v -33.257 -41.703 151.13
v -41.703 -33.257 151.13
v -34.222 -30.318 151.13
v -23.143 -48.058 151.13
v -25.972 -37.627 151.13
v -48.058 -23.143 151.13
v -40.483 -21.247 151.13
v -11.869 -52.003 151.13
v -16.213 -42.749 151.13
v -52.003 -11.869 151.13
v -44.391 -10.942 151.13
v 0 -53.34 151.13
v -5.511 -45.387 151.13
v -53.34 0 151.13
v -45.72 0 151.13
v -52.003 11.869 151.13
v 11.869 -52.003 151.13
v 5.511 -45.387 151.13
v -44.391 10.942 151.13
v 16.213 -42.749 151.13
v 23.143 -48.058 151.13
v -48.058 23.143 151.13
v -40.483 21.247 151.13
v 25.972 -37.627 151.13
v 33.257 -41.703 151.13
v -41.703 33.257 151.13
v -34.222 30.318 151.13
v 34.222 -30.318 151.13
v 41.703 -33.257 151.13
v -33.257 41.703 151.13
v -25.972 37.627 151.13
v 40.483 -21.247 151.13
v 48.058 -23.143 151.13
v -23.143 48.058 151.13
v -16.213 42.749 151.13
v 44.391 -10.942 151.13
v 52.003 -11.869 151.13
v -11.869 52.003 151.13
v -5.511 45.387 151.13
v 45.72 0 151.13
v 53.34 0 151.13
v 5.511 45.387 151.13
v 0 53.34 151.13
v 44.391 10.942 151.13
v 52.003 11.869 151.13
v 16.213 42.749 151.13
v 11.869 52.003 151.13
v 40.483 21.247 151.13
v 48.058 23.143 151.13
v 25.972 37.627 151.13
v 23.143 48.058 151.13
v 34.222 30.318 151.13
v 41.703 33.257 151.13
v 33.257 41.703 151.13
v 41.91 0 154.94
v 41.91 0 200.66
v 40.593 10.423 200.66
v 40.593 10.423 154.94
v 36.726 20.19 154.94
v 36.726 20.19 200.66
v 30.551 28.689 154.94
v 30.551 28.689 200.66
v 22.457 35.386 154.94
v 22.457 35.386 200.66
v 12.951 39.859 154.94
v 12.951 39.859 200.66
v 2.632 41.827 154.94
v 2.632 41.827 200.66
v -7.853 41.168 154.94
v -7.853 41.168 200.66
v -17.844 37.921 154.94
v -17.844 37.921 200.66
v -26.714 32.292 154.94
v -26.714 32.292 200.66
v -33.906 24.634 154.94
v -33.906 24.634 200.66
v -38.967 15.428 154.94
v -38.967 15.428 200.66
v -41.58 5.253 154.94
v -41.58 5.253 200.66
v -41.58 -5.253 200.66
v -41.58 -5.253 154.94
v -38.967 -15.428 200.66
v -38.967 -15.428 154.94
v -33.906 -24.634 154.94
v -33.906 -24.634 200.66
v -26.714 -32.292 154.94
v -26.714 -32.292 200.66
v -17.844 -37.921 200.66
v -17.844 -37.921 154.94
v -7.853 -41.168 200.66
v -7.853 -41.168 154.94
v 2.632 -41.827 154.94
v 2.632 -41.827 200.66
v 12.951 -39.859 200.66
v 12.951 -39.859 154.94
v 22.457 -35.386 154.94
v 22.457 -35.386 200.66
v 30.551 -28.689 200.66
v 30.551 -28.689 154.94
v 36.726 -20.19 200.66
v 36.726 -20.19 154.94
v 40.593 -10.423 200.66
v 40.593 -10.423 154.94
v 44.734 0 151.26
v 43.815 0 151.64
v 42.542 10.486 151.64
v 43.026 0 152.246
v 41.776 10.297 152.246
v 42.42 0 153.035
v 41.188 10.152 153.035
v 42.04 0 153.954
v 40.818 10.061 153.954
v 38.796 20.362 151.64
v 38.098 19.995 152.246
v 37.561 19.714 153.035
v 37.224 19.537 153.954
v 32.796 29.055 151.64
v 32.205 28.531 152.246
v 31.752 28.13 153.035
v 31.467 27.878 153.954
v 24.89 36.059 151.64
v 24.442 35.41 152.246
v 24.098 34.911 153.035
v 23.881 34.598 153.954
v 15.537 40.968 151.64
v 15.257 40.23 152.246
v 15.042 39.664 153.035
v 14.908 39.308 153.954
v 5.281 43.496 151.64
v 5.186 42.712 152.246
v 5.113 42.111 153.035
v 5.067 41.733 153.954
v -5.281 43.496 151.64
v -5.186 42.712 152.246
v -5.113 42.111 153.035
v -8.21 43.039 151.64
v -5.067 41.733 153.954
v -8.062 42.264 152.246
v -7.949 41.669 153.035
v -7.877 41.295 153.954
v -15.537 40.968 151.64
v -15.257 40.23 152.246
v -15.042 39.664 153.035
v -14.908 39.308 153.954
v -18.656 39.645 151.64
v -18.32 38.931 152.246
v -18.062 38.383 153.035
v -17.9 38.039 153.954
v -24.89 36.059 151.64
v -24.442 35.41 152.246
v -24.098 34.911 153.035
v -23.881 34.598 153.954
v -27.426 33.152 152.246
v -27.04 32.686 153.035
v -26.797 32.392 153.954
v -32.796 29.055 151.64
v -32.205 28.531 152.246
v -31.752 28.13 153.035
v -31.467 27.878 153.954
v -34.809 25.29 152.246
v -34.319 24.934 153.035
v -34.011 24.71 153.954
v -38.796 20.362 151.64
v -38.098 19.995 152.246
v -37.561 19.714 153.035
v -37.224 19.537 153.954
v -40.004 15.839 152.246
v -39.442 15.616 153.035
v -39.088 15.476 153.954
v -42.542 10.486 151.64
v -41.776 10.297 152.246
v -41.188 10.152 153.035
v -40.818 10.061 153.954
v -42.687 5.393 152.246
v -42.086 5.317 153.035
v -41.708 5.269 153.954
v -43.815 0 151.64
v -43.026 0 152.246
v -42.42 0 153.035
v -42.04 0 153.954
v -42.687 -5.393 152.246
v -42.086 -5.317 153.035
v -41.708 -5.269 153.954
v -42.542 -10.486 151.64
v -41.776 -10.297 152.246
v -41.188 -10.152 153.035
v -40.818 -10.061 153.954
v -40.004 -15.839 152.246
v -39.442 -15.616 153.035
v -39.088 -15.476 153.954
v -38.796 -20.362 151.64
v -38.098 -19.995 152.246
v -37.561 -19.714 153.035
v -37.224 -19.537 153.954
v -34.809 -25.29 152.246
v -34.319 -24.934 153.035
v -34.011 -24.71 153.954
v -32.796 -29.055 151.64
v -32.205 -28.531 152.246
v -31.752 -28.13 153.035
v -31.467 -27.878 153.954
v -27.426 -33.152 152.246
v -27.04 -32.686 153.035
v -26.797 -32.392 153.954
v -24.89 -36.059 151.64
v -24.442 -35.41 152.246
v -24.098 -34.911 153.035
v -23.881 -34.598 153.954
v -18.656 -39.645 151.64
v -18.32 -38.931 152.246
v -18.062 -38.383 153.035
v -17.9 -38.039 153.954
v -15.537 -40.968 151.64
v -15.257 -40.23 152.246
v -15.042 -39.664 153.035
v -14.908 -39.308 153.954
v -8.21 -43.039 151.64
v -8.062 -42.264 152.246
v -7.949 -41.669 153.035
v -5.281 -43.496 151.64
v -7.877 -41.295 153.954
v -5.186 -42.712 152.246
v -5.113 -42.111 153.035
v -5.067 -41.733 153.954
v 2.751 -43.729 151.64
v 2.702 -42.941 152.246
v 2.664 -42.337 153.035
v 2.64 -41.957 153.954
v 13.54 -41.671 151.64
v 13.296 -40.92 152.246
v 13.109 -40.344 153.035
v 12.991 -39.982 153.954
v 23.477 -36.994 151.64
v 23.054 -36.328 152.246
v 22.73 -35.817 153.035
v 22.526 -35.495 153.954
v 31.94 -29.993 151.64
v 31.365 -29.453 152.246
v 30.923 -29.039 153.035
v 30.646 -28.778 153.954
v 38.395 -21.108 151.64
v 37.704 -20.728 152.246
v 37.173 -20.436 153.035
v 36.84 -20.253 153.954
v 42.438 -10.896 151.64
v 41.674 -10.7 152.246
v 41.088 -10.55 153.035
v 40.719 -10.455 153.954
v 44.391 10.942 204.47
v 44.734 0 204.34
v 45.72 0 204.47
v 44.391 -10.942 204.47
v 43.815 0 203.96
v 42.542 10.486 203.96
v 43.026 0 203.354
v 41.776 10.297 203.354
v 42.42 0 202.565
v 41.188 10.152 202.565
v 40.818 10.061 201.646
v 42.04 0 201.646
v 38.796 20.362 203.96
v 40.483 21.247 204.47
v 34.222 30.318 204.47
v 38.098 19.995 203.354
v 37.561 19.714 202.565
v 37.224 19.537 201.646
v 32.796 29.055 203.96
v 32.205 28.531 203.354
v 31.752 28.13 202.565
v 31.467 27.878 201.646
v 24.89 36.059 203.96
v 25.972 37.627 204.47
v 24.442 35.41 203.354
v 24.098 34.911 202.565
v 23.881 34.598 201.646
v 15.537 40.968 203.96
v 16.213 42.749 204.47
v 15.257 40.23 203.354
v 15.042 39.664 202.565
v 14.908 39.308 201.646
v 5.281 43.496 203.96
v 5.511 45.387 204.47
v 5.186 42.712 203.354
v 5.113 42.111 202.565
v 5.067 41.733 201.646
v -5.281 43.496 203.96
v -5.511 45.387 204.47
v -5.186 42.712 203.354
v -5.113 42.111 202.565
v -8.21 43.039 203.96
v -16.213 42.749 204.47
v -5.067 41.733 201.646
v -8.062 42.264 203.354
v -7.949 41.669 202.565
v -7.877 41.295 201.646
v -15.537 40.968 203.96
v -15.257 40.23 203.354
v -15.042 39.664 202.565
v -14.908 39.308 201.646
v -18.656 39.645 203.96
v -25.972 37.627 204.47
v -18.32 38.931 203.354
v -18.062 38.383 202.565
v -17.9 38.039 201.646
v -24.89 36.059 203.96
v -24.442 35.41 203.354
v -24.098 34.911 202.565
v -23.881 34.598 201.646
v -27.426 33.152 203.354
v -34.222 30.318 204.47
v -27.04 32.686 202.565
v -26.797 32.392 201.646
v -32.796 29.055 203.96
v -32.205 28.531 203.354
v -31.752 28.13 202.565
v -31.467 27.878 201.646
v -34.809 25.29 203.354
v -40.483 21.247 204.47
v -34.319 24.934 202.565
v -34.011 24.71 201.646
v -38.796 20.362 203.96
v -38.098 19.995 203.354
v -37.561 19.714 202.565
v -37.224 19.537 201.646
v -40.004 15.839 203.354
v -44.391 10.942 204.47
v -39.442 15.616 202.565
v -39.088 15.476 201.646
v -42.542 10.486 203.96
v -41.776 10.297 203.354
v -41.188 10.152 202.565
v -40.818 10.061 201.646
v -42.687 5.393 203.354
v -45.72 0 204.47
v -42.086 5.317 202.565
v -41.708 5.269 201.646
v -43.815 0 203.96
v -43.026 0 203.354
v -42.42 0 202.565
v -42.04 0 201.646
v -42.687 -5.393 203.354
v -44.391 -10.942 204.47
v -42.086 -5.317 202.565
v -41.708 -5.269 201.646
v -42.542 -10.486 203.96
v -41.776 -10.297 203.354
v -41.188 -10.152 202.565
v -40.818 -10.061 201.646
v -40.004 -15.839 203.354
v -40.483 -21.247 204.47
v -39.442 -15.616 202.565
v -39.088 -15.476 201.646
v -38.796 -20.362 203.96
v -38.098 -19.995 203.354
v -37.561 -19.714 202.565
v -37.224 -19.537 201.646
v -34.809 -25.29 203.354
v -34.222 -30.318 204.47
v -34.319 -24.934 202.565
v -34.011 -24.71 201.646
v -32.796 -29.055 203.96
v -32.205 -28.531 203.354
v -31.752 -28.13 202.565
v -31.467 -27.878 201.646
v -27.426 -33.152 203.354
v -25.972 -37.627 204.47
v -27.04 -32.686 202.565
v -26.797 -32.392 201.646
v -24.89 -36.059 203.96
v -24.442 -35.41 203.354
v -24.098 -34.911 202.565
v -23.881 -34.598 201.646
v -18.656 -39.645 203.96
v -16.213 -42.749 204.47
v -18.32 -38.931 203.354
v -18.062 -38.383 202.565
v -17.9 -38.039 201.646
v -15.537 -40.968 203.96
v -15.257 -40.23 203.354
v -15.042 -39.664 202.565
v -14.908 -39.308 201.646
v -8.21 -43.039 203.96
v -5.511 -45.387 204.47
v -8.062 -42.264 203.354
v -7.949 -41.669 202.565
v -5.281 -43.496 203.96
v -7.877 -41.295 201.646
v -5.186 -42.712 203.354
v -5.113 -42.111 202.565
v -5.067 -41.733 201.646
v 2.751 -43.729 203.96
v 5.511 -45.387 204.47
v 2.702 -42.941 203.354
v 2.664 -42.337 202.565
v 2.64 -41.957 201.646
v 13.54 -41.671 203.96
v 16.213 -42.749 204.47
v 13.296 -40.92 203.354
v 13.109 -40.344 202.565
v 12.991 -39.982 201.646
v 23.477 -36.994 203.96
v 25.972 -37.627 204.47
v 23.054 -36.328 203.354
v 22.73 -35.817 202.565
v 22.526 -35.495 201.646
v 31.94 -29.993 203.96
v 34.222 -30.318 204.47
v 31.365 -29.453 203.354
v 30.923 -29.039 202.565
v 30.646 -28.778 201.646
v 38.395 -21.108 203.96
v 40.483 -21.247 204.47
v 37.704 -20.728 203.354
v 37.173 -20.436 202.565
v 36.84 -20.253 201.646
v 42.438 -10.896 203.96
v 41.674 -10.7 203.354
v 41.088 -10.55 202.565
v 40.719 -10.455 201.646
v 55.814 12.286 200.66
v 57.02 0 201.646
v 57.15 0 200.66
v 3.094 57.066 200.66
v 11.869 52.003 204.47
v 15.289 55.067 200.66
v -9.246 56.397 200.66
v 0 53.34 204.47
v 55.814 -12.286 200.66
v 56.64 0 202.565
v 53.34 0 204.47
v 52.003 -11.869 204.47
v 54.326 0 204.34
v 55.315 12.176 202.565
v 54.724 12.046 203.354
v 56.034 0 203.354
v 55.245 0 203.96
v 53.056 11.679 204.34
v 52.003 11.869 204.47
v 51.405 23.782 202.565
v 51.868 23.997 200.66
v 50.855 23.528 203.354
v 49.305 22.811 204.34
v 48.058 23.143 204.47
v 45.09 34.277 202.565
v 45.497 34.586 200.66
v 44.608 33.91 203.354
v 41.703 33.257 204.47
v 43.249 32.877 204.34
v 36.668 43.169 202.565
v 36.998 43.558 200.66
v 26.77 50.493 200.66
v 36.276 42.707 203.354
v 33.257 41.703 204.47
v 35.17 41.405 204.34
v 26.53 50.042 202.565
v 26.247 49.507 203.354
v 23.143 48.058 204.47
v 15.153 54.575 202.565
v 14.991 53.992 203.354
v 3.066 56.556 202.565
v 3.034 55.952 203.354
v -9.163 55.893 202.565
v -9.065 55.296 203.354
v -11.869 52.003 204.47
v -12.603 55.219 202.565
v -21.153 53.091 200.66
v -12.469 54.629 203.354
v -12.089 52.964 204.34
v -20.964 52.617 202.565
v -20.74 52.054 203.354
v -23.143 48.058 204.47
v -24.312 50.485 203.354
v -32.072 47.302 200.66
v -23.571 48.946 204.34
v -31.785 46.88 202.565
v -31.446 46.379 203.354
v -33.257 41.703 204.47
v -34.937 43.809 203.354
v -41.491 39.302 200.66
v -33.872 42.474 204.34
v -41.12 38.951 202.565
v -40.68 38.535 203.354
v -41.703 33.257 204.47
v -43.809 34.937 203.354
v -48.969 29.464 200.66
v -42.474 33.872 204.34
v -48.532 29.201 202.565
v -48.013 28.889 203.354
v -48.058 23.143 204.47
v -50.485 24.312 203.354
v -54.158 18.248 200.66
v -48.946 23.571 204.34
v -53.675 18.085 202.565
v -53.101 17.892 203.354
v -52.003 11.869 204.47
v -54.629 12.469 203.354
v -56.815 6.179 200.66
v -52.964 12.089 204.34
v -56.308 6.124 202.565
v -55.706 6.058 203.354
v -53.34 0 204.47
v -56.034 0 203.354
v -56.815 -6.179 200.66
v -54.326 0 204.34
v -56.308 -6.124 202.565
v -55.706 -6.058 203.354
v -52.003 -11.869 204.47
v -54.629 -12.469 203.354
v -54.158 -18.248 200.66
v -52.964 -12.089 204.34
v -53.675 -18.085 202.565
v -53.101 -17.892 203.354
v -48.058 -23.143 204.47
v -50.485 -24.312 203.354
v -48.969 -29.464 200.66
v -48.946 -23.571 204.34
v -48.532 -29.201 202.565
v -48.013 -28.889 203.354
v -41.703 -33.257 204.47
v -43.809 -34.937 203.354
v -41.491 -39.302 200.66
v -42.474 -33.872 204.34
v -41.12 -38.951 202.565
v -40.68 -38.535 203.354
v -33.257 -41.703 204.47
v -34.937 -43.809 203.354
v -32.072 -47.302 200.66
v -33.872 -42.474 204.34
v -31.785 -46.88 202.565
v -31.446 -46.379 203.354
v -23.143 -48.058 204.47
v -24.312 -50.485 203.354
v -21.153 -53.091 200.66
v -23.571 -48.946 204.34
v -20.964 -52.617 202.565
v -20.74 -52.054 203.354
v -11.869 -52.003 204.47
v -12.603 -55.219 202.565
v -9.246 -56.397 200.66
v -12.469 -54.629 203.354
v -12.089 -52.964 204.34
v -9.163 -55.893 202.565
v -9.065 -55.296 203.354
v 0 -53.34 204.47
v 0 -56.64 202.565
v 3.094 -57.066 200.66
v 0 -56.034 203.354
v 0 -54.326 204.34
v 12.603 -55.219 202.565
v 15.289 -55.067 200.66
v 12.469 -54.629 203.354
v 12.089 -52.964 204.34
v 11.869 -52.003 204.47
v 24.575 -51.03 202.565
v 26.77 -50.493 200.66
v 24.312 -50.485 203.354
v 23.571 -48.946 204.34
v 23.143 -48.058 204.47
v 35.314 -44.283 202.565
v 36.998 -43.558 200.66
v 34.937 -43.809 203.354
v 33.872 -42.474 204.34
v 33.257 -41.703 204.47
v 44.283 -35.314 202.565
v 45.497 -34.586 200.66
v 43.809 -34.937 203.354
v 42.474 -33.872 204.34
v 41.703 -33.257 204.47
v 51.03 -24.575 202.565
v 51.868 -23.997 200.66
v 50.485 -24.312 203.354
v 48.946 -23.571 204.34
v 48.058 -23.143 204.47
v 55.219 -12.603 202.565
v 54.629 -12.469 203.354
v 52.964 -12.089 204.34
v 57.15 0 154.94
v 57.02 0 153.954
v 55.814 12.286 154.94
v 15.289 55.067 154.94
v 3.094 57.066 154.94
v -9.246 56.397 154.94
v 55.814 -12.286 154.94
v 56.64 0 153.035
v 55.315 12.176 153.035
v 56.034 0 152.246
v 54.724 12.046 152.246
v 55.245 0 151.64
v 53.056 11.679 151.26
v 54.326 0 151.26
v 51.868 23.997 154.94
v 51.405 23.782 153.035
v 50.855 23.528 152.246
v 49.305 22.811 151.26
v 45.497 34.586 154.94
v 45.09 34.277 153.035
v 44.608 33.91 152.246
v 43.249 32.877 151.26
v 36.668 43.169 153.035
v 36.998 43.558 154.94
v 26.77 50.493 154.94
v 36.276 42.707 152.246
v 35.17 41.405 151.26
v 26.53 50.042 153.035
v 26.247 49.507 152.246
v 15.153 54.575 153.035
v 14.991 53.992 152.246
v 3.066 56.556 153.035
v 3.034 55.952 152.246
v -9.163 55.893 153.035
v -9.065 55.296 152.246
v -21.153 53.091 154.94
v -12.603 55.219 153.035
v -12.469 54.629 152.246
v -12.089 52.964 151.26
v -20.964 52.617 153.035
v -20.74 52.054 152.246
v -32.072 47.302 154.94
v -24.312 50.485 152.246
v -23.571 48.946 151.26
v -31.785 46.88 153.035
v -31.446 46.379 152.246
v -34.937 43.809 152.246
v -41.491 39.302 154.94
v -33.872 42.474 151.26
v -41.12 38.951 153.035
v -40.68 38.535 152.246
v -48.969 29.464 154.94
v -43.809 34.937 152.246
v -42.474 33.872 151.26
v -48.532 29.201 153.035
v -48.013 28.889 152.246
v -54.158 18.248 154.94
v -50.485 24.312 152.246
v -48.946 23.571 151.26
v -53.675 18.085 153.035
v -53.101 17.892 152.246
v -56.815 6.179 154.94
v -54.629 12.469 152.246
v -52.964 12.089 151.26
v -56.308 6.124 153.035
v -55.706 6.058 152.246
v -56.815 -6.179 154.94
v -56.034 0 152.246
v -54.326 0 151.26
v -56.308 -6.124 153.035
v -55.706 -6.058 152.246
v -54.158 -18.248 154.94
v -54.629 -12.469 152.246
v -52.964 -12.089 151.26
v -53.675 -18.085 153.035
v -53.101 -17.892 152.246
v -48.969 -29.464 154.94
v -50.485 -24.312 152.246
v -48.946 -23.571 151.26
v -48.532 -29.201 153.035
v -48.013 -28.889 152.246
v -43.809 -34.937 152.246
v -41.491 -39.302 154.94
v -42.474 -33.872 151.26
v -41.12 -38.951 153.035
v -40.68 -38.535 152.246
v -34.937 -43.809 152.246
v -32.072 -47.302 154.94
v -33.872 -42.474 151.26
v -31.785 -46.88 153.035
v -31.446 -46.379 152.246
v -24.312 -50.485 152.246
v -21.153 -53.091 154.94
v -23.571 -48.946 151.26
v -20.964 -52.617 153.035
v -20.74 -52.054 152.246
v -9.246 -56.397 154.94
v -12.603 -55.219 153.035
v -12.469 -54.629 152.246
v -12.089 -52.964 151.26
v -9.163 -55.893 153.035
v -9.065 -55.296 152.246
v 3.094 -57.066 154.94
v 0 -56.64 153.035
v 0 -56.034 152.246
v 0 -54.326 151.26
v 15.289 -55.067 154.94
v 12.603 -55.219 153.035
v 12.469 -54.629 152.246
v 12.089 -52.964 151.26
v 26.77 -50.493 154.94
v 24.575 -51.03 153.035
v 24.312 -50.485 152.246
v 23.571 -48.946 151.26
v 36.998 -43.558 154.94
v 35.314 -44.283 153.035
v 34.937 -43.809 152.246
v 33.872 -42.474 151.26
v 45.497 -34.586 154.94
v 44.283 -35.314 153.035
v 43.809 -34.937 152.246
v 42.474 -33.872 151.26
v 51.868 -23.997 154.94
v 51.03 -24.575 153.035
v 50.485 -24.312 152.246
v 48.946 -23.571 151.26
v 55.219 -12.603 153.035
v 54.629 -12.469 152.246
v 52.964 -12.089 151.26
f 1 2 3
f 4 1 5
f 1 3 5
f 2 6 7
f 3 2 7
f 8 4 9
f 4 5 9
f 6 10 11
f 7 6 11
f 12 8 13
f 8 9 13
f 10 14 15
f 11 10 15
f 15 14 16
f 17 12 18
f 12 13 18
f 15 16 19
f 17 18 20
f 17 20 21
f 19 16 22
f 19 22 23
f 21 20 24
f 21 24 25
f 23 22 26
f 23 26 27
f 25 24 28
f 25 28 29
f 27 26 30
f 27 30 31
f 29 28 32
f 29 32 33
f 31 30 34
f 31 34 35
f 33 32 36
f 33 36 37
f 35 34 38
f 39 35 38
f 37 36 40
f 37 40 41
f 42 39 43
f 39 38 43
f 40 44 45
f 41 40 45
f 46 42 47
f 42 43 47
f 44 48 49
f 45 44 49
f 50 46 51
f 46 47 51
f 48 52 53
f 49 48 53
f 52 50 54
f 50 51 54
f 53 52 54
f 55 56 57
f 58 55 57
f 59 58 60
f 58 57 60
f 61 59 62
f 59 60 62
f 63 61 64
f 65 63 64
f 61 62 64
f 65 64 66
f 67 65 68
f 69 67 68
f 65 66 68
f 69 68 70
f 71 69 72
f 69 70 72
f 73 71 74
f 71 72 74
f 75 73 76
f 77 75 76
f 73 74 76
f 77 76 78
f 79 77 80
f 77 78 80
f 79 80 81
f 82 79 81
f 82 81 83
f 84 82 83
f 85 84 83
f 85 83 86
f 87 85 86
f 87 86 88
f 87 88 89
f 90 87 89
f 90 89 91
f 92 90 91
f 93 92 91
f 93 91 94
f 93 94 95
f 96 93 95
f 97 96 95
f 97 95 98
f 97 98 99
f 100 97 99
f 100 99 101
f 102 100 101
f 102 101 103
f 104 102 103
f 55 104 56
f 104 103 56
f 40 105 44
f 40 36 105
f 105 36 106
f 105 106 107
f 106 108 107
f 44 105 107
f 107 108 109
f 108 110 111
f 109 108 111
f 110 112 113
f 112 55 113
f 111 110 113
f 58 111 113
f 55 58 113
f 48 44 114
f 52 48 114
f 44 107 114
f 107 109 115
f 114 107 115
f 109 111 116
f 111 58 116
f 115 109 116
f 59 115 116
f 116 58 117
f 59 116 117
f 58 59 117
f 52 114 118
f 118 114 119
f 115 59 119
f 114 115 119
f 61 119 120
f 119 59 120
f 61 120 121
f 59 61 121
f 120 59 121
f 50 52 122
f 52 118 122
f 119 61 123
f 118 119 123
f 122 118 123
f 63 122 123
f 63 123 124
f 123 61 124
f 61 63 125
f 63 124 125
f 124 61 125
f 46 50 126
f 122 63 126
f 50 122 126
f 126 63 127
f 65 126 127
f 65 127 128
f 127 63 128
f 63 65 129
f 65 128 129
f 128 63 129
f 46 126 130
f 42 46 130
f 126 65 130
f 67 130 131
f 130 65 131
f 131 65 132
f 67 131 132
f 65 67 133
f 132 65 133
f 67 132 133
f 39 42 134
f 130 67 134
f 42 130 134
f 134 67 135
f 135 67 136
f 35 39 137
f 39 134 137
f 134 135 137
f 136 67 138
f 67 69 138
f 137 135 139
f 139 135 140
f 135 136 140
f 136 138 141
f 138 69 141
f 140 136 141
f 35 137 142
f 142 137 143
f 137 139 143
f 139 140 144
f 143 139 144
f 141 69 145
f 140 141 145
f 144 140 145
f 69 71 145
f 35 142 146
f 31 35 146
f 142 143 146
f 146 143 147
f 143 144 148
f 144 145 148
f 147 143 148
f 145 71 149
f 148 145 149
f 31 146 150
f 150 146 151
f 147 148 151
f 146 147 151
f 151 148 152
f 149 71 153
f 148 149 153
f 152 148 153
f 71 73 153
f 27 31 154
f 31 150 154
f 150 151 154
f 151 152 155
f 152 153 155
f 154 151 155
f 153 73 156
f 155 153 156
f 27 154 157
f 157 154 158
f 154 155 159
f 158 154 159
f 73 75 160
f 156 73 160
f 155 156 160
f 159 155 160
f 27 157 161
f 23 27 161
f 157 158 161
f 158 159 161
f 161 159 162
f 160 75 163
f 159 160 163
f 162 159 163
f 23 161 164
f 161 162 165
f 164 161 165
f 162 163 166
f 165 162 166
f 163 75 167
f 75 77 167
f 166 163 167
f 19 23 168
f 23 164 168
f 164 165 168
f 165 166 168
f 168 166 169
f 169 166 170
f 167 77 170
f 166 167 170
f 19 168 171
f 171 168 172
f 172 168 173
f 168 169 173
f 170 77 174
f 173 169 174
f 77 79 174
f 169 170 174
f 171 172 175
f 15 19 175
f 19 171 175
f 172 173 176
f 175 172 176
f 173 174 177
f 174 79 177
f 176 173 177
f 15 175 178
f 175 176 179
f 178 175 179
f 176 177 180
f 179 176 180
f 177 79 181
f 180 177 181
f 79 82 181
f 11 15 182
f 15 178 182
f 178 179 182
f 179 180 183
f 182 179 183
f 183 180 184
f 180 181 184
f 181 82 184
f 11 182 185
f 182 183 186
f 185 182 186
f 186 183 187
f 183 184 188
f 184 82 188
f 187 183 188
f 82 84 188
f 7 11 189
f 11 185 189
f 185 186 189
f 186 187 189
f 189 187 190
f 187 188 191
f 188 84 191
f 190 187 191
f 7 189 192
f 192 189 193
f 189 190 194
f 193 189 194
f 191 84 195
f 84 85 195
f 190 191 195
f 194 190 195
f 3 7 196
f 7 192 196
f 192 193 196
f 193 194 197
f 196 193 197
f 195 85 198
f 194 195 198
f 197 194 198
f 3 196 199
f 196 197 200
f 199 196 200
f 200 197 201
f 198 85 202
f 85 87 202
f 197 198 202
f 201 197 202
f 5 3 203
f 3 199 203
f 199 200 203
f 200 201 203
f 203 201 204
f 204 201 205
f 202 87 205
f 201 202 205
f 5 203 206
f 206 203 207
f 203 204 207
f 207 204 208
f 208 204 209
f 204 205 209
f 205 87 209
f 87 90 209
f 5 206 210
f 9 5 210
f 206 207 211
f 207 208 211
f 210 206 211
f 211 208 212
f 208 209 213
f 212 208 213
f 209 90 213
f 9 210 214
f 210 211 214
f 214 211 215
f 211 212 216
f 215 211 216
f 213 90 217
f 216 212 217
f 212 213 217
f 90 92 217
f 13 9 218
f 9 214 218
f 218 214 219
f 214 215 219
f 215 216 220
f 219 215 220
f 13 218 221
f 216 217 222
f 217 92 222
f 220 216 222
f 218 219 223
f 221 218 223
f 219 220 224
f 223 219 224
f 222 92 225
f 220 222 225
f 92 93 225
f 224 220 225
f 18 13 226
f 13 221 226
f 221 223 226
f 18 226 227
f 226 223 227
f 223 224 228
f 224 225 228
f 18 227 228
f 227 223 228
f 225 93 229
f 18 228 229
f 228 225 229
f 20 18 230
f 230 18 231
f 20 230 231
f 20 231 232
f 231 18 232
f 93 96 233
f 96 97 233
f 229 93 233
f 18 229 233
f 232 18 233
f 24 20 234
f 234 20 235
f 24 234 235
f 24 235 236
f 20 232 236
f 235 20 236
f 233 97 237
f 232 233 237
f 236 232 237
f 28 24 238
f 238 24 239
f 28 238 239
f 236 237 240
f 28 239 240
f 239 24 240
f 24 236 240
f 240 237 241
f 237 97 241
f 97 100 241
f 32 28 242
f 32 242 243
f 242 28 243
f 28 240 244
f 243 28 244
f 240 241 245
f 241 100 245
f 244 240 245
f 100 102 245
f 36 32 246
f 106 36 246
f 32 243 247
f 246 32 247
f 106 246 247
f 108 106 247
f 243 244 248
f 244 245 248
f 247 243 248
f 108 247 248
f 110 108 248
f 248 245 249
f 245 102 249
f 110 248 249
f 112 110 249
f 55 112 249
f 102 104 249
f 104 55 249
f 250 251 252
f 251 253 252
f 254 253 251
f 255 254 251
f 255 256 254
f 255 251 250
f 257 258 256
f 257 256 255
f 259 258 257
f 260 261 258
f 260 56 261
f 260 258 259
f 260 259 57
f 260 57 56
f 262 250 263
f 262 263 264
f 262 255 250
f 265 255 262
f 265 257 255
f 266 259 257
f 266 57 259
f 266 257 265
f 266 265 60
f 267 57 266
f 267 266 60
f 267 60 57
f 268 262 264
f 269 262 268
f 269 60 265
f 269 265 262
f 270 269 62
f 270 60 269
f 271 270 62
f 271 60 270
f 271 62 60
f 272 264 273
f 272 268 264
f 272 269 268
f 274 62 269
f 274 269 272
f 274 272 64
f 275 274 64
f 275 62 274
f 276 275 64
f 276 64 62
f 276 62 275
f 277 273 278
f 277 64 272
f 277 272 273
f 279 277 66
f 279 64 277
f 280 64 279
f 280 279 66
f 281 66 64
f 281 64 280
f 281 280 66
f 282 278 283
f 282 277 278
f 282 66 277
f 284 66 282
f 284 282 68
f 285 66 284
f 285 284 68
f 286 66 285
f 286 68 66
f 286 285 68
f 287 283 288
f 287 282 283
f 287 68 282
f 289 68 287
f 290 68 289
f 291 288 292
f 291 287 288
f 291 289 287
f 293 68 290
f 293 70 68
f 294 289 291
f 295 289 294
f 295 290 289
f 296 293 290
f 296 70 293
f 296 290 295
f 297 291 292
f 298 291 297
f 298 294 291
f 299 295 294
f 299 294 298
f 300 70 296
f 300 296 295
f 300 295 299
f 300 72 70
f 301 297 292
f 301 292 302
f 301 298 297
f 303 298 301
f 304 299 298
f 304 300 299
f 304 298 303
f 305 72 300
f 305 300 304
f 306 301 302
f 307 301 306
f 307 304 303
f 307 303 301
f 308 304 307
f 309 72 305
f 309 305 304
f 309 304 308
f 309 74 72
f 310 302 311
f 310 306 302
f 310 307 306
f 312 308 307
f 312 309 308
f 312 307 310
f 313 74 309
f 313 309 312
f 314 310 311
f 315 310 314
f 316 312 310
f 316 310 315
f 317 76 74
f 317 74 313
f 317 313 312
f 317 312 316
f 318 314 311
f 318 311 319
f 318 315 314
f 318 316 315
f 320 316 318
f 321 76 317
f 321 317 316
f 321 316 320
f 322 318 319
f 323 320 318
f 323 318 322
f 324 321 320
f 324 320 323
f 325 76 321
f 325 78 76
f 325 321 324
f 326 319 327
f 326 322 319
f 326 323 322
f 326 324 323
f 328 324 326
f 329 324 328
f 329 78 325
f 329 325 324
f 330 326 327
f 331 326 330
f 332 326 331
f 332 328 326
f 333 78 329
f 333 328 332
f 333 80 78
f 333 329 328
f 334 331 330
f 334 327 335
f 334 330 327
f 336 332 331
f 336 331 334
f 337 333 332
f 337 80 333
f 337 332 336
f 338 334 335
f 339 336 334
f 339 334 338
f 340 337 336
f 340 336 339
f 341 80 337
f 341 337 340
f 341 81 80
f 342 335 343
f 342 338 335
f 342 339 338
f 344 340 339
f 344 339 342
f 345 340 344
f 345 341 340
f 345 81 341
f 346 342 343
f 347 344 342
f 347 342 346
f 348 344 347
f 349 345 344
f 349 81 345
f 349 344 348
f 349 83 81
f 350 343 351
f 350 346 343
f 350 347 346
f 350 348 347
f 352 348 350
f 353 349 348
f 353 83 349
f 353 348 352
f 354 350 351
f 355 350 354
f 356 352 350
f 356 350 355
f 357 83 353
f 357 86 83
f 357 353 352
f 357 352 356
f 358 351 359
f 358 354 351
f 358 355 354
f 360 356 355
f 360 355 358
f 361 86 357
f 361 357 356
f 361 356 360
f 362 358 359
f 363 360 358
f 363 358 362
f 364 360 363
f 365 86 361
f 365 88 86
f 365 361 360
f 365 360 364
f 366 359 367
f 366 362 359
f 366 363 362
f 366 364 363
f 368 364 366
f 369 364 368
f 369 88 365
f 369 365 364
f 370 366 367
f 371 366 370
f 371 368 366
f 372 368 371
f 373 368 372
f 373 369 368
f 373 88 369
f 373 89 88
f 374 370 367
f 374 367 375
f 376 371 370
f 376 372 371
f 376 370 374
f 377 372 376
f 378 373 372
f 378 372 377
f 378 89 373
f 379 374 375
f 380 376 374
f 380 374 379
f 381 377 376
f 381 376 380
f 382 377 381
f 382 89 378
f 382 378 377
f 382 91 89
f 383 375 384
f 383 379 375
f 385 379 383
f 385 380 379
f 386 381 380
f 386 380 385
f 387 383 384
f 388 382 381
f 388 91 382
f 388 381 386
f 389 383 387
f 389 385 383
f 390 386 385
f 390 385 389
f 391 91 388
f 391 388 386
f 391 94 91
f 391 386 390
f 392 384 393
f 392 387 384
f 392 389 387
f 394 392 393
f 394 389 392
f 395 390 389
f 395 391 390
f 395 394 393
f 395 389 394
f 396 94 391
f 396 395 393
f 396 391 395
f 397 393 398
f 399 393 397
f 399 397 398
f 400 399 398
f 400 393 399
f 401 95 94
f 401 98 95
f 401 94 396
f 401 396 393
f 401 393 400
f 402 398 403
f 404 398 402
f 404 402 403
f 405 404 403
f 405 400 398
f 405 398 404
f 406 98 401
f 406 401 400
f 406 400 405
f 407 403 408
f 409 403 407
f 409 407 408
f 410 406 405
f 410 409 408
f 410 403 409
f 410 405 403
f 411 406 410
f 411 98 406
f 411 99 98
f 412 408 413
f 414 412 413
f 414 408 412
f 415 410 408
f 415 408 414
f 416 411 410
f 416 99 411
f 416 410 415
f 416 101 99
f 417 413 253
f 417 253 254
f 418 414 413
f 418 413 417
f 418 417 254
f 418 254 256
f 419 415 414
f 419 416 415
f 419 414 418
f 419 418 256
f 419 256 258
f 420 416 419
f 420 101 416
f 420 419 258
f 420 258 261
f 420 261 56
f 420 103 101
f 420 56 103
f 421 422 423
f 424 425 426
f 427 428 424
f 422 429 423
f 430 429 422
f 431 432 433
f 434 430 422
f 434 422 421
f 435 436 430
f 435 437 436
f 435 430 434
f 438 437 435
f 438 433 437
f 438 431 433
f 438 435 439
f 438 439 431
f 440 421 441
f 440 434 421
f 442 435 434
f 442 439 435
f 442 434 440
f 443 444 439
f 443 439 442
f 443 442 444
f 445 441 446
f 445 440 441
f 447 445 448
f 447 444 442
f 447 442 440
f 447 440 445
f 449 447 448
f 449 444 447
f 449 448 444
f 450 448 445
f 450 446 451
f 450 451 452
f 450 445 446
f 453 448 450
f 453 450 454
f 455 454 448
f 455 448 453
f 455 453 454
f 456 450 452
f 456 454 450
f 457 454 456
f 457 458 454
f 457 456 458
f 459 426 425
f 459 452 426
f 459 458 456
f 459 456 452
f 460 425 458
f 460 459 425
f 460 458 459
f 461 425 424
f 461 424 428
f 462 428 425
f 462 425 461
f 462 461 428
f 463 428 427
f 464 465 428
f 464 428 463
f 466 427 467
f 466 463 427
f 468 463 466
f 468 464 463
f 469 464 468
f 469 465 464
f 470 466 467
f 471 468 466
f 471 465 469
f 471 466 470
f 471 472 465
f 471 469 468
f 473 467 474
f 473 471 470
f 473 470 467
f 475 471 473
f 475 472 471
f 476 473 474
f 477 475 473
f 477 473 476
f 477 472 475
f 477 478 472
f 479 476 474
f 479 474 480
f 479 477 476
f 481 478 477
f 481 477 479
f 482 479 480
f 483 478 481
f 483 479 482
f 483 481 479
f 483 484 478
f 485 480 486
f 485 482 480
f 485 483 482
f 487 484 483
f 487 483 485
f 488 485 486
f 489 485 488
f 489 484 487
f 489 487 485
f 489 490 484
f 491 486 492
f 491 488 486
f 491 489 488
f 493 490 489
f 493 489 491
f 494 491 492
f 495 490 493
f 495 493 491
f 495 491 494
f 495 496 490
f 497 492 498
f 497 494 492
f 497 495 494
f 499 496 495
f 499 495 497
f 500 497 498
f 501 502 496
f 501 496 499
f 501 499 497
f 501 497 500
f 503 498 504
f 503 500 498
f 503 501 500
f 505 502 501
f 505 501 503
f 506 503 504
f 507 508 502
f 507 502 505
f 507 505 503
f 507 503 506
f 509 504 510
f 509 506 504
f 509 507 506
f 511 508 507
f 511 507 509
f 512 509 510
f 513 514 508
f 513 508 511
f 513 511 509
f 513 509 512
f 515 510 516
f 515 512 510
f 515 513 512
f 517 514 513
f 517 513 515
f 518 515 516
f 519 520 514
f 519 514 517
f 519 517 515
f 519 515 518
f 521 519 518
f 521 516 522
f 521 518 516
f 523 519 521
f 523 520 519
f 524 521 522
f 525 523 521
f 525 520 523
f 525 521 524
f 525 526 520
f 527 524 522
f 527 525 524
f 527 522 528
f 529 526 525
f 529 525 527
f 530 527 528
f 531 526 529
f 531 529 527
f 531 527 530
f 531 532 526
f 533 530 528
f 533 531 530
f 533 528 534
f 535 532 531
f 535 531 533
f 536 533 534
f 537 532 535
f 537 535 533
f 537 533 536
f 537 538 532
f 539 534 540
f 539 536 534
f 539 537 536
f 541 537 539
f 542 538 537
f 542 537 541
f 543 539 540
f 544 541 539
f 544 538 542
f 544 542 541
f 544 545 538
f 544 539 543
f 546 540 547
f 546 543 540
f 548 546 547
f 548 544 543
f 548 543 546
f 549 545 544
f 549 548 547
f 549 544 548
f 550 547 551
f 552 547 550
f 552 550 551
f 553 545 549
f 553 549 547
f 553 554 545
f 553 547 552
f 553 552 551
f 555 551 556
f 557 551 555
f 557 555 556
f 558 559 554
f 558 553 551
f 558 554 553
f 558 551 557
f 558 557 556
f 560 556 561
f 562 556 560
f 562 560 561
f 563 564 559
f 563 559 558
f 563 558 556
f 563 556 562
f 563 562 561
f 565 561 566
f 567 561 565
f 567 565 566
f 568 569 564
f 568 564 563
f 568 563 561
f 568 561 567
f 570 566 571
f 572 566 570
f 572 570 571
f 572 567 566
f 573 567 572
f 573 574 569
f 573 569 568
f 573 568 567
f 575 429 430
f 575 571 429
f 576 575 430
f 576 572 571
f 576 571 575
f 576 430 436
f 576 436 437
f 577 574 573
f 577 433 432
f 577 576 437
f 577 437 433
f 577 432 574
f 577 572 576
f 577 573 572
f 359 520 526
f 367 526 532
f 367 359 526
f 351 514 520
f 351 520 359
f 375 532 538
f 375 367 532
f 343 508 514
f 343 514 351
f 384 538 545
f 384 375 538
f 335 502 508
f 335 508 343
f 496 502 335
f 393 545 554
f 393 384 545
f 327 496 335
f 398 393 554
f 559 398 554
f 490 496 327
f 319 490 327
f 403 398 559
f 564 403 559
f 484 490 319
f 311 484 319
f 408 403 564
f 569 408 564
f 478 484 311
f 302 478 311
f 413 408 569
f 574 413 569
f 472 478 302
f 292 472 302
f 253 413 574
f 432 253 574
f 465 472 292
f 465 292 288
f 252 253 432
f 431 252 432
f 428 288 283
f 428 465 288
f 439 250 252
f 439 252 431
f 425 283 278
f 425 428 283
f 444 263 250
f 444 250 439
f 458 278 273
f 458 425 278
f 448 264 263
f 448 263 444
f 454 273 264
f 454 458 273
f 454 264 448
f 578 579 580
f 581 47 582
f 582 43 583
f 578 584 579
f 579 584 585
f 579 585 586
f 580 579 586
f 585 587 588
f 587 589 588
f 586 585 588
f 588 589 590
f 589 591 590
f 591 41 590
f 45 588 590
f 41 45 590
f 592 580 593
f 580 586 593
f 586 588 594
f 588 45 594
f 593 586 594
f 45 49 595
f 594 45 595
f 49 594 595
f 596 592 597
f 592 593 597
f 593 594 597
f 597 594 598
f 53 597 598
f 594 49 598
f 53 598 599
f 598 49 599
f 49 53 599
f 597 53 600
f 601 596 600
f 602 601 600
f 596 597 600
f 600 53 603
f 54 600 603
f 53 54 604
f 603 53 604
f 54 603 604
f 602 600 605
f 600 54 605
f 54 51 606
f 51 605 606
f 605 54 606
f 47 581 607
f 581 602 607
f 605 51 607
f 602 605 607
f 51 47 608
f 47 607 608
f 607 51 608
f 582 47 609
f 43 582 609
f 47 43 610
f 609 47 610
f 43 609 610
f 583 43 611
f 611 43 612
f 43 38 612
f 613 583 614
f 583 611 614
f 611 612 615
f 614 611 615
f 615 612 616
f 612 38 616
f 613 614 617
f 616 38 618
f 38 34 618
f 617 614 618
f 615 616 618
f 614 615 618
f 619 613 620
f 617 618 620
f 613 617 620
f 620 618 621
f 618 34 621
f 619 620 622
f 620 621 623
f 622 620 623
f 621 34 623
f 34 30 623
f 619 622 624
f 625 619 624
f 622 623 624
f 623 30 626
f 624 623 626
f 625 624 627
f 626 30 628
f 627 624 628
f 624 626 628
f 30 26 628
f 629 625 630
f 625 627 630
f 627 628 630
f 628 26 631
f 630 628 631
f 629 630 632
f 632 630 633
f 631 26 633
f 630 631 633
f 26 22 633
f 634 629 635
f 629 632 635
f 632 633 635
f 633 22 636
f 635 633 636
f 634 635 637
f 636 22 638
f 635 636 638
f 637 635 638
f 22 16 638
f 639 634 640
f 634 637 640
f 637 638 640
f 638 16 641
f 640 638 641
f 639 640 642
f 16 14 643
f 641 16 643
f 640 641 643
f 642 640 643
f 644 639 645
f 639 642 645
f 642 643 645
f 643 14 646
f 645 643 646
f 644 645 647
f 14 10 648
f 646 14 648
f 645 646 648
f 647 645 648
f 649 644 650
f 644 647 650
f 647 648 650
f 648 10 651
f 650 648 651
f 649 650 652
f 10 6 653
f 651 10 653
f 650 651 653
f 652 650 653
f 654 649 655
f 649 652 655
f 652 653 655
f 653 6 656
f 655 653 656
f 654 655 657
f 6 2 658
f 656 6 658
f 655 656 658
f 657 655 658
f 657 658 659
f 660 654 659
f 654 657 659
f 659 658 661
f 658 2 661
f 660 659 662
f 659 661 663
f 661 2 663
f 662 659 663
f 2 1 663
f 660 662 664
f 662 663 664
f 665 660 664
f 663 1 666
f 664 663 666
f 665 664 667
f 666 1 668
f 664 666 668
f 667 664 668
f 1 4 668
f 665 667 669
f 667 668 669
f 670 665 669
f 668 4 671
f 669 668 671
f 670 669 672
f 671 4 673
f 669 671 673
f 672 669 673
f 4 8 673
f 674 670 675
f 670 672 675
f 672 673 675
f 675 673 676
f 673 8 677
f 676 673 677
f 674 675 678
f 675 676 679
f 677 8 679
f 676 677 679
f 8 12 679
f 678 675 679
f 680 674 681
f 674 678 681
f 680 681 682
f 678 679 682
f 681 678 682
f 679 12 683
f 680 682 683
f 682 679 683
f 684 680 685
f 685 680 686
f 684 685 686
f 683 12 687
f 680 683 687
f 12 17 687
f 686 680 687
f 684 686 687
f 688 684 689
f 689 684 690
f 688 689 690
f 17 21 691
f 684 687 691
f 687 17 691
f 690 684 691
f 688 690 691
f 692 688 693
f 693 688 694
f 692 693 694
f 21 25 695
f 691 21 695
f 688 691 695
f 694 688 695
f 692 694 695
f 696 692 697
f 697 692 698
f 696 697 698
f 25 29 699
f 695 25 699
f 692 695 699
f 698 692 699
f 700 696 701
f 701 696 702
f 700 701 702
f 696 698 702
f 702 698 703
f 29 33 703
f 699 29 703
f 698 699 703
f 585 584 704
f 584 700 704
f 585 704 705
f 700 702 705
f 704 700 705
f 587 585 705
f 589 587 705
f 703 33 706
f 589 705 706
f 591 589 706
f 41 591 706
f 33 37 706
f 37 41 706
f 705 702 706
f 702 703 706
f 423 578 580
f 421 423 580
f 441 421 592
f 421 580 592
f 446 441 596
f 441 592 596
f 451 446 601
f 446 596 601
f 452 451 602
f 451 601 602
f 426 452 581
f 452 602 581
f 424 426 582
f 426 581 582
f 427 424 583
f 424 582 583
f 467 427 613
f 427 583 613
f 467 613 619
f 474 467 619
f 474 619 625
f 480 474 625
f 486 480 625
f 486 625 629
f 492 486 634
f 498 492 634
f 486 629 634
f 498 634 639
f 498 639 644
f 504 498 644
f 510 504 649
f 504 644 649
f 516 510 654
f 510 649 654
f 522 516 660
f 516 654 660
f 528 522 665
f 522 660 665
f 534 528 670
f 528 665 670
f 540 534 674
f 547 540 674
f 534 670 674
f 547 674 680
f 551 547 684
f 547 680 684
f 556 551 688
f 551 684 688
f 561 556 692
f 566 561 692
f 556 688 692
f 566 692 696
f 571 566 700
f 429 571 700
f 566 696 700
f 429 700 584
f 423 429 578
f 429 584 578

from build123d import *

# Parameters (mm, degrees)
SKETCH2_R           = 381
BOSS_EXTRUDE1_DEPTH = 355.6
SKETCH3_R           = 279.4
CUT_EXTRUDE1_DEPTH  = 646.579863379
FILLET3_R           = 25.4
FILLET4_R           = 25.4
SCALE1_SCALE        = 0.15


with BuildPart() as part:
    # Sketch2 → Boss-Extrude1 (new body)
    with BuildSketch(Plane.XY):
        Circle(SKETCH2_R)
    extrude(amount=BOSS_EXTRUDE1_DEPTH)

    # Sketch3 → Cut-Extrude1 (cut, through all)
    with BuildSketch(Plane.XY.offset(355.6)):
        Circle(SKETCH3_R)
    extrude(amount=-CUT_EXTRUDE1_DEPTH, mode=Mode.SUBTRACT)

    # Fillet3
    fillet3_edges = [part.edges().sort_by_distance(p)[0] for p in [
        (-381, 0, 0),
        (-381, 0, 355.6),
    ]]
    fillet(fillet3_edges, radius=FILLET3_R)

    # Fillet4
    fillet4_edges = [part.edges().sort_by_distance(p)[0] for p in [
        (-279.4, 0, 0),
        (-279.4, 0, 355.6),
    ]]
    fillet(fillet4_edges, radius=FILLET4_R)


with BuildPart() as part_1:
    # Scale1: scaled about (0, 0, 177.8)
    add(part.part.scale(SCALE1_SCALE).moved(Location((0, 0, 151.13))))


solid = part_1.part
